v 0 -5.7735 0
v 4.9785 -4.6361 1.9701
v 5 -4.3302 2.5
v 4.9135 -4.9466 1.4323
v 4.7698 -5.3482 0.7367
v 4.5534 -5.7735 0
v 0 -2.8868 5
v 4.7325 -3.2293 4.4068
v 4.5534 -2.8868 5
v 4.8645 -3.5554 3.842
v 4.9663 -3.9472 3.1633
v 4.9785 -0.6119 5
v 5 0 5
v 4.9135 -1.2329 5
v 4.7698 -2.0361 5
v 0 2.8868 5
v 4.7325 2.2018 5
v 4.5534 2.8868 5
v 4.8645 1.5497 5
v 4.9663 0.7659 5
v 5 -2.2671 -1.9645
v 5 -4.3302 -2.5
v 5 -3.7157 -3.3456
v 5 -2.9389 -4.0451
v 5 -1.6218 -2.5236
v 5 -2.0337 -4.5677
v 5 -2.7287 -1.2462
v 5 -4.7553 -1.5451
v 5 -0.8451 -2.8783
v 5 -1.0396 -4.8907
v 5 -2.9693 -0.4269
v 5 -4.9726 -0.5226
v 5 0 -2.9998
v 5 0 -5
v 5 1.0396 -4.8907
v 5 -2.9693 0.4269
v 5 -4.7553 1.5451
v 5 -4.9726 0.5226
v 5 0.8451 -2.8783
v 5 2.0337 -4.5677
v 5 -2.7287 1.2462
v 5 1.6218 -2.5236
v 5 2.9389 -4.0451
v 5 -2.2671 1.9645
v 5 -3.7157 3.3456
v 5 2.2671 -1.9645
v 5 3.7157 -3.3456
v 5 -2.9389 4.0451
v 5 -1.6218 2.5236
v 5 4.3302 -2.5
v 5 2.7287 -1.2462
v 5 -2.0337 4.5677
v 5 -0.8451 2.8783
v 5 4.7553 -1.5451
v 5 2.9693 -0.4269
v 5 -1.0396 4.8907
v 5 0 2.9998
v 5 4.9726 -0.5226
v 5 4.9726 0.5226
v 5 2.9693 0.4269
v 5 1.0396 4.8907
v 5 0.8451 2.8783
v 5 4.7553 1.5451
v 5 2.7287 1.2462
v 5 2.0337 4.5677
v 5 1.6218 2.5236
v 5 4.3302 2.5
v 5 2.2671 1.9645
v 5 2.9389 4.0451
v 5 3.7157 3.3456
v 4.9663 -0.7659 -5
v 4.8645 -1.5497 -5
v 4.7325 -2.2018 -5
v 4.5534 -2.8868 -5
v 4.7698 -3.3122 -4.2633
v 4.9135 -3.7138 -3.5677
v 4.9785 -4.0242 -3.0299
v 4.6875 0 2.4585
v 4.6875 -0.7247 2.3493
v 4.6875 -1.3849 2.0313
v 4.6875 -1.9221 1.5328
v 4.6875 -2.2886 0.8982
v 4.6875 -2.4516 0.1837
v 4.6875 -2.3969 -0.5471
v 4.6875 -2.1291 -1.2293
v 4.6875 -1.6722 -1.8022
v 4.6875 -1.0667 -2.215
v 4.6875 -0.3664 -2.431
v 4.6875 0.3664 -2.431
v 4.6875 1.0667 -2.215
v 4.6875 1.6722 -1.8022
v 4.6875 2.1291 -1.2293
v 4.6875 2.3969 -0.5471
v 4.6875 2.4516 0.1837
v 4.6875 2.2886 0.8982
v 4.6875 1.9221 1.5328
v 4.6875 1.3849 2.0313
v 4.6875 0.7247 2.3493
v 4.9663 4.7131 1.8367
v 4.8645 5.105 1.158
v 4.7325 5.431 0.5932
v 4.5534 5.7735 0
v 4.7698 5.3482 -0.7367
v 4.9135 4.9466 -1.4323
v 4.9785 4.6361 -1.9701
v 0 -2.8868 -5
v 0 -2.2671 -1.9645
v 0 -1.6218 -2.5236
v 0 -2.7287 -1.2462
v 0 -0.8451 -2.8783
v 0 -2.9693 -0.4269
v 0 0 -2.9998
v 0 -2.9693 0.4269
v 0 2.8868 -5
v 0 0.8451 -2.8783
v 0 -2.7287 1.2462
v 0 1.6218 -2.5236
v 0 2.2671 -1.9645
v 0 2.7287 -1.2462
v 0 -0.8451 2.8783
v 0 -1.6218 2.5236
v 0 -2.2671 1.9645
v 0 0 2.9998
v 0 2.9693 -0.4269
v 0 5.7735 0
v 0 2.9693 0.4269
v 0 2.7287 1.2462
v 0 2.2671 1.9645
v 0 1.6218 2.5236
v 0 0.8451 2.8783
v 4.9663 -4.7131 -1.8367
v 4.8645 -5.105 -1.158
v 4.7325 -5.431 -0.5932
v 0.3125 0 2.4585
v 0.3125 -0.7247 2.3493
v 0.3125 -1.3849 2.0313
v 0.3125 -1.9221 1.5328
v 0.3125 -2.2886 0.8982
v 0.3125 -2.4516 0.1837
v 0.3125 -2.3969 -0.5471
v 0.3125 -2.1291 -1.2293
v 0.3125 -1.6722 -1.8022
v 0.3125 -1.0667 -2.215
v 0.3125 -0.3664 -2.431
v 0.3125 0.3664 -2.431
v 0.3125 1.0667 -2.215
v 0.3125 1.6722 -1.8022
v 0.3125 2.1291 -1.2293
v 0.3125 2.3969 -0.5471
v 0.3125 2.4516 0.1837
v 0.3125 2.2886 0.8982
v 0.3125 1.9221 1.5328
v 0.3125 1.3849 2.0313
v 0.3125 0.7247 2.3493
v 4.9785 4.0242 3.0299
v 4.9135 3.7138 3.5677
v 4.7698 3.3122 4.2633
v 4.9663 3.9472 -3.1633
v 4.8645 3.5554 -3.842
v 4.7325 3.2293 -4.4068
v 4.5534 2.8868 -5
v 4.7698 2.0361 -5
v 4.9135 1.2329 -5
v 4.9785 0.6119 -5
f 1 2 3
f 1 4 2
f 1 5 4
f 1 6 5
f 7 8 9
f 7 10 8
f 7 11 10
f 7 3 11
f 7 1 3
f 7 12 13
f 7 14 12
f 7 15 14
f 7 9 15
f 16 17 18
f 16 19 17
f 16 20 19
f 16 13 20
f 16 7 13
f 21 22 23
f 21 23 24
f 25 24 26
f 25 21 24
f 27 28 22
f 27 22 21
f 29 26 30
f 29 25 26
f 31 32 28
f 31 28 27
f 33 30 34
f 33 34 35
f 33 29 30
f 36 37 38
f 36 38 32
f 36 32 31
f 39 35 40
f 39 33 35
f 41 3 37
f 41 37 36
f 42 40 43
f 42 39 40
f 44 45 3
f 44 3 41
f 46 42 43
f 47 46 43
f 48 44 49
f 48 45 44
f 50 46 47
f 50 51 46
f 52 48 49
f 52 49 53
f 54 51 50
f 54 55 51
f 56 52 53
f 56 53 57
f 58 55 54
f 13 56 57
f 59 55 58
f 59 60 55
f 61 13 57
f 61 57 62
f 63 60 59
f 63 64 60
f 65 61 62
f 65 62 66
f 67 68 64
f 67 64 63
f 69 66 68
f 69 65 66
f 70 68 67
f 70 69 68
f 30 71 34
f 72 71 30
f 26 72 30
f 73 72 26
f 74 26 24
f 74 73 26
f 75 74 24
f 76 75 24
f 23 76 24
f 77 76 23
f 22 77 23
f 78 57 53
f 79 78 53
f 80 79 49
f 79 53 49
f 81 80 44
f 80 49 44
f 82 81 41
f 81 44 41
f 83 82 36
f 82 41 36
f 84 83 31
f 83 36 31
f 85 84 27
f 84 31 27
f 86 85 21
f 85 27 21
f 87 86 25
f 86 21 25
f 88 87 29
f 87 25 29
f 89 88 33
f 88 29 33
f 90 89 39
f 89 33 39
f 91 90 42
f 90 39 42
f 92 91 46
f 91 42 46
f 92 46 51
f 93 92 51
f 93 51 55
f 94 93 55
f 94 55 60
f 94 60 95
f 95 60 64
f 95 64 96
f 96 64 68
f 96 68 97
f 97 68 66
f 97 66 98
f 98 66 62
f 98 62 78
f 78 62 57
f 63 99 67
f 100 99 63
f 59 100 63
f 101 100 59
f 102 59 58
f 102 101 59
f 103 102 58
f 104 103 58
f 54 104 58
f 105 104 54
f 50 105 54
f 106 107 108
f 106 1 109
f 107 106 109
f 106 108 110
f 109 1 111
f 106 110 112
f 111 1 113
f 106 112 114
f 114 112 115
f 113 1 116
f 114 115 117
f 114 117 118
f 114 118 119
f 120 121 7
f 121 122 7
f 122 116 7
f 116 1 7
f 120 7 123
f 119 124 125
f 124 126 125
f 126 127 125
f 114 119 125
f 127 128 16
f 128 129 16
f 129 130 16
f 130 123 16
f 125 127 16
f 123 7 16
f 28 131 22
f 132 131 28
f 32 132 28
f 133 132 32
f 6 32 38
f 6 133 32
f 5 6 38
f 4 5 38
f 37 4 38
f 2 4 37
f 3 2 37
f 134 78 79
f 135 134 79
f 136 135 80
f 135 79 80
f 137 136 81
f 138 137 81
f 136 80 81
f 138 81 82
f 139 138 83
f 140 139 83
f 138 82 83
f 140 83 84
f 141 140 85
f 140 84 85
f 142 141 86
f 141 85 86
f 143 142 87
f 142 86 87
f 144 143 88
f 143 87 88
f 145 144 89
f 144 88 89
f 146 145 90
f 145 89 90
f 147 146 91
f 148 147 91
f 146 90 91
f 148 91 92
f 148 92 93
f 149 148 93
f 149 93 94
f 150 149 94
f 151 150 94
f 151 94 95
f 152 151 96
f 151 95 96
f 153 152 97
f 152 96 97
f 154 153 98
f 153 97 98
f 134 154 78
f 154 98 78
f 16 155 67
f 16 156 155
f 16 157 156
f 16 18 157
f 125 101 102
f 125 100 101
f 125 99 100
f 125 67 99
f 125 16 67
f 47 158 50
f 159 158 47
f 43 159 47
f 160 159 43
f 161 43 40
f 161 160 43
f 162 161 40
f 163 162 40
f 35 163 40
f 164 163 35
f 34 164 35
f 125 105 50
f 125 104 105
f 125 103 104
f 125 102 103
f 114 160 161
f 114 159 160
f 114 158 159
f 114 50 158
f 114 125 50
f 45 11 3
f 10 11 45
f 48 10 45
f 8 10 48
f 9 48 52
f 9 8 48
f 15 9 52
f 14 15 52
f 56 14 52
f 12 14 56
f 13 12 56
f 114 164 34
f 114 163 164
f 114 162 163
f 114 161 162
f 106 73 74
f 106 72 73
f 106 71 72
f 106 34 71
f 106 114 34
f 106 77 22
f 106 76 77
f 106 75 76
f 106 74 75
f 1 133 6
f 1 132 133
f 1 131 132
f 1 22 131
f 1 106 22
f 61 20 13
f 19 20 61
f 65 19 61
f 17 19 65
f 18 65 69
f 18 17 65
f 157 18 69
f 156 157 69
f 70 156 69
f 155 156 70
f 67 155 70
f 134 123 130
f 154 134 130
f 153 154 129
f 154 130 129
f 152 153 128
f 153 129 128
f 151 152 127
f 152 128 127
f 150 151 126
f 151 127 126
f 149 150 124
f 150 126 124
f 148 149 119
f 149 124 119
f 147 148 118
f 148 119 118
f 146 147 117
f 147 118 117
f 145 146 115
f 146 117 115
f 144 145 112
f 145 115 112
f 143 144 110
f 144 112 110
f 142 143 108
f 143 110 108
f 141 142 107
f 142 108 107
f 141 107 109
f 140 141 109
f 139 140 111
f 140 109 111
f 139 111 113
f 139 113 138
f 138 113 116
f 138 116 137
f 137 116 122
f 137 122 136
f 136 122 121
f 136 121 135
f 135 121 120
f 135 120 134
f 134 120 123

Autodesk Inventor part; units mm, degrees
ref_plane "YZ Plane" through (0, 0, 0) normal (1, 0, 0) x (0, 1, 0)
ref_plane "XZ Plane" through (0, 0, 0) normal (0, 1, 0) x (-1, 0, 0)
sketch "Sketch1" plane through (0, 0, 0) normal (1, 0, 0) x (0, 1, 0)
  line L0 (5.7735, 0) -> (2.8868, -5)
  line L1 (2.8868, -5) -> (-2.8868, -5)
  line L2 (-2.8868, -5) -> (-5.7735, 0)
  line L3 (-5.7735, 0) -> (-2.8868, 5)
  line L4 (-2.8868, 5) -> (2.8868, 5)
  line L5 (2.8868, 5) -> (5.7735, 0)
  point P0 (0, 0)
  point P1 (0, 0)
  dimension "d0" = 11.547
extrude "Body" add sketch "Sketch1" along normal blind 5
sketch "Sketch2" plane through (0, 0, 0) normal (-1, 0, 0) x (0, 0, 1)
  point P0 (0, 0)
hole "Thread" at (0, 0, 0) direction (1, 0, 0) diameter 4.917 end through all thread size "M6x1" class "6H" standard "ISO Metric profile"
chamfer "Chamfer1" distance 0.5413 angle 30 1 edges at (0, 0, -2.4585) measured on face at (0, -3.5612, 2.1322)
chamfer "Chamfer2" distance 0.5413 angle 30 1 edges at (5, 0, -2.4585) measured on face at (5, -3.5612, 2.1322)
sketch "Sketch3" plane through (0, 0, 0) normal (0, 0, 1) x (1, 0, 0)
  line L0 (0, 5.7735) -> (5, 5.7735) projected
  line L1 (5, 2.8868) -> (5, 5.7735) projected
  line L2 (-1, 0) -> (6, 0) projected
  line L3 (4.5534, 5.7735) -> (5, 5)
  dimension "d3" = 10
  dimension "d4" = 30
revolve "Chamfer3" cut sketch "Sketch3" angle 360 about axis through (-10, 0, 0) along (1, 0, 0)
ref_plane "Work Plane1" through (16.0728, 0, 0) normal (0, 0.8660254, -0.5) x (-1, 0, 0)
equation "\"d0\" = 1.1547 * SW"
equation "\"d1\" = KOH"
equation "\"d13\" = -0.5 * GD1 + 0.5 * NND"
equation "\"d21\" = -0.5 * GD1 + 0.5 * NND"
equation "\"d15\" = -0.5 * GD1 + 0.5 * NND"
equation "\"d22\" = -0.5 * GD1 + 0.5 * NND"
equation "\"d3\" = SW01"
equation "\"d4\" = ANG2"
equation "\"ANG2\" = 30deg"
equation "\"NND\" = 6"
equation "\"KOH\" = 5"
equation "\"SW01\" = SW"
equation "\"GUL\" = 0.541266 * PTC"
equation "\"TOA\" = 30deg"
equation "\"PTC\" = 1"
equation "\"E0\" = 1.155 * SW"
equation "\"THREADDIA\" = 6"
equation "\"GAL\" = 0.541266 * PTC"
equation "\"SW\" = 10"
equation "\"GD1\" = 4.917468"
properties part number "JIS B 1181 - HN - class 1 - Finished - M6" material "Steel, Mild"
